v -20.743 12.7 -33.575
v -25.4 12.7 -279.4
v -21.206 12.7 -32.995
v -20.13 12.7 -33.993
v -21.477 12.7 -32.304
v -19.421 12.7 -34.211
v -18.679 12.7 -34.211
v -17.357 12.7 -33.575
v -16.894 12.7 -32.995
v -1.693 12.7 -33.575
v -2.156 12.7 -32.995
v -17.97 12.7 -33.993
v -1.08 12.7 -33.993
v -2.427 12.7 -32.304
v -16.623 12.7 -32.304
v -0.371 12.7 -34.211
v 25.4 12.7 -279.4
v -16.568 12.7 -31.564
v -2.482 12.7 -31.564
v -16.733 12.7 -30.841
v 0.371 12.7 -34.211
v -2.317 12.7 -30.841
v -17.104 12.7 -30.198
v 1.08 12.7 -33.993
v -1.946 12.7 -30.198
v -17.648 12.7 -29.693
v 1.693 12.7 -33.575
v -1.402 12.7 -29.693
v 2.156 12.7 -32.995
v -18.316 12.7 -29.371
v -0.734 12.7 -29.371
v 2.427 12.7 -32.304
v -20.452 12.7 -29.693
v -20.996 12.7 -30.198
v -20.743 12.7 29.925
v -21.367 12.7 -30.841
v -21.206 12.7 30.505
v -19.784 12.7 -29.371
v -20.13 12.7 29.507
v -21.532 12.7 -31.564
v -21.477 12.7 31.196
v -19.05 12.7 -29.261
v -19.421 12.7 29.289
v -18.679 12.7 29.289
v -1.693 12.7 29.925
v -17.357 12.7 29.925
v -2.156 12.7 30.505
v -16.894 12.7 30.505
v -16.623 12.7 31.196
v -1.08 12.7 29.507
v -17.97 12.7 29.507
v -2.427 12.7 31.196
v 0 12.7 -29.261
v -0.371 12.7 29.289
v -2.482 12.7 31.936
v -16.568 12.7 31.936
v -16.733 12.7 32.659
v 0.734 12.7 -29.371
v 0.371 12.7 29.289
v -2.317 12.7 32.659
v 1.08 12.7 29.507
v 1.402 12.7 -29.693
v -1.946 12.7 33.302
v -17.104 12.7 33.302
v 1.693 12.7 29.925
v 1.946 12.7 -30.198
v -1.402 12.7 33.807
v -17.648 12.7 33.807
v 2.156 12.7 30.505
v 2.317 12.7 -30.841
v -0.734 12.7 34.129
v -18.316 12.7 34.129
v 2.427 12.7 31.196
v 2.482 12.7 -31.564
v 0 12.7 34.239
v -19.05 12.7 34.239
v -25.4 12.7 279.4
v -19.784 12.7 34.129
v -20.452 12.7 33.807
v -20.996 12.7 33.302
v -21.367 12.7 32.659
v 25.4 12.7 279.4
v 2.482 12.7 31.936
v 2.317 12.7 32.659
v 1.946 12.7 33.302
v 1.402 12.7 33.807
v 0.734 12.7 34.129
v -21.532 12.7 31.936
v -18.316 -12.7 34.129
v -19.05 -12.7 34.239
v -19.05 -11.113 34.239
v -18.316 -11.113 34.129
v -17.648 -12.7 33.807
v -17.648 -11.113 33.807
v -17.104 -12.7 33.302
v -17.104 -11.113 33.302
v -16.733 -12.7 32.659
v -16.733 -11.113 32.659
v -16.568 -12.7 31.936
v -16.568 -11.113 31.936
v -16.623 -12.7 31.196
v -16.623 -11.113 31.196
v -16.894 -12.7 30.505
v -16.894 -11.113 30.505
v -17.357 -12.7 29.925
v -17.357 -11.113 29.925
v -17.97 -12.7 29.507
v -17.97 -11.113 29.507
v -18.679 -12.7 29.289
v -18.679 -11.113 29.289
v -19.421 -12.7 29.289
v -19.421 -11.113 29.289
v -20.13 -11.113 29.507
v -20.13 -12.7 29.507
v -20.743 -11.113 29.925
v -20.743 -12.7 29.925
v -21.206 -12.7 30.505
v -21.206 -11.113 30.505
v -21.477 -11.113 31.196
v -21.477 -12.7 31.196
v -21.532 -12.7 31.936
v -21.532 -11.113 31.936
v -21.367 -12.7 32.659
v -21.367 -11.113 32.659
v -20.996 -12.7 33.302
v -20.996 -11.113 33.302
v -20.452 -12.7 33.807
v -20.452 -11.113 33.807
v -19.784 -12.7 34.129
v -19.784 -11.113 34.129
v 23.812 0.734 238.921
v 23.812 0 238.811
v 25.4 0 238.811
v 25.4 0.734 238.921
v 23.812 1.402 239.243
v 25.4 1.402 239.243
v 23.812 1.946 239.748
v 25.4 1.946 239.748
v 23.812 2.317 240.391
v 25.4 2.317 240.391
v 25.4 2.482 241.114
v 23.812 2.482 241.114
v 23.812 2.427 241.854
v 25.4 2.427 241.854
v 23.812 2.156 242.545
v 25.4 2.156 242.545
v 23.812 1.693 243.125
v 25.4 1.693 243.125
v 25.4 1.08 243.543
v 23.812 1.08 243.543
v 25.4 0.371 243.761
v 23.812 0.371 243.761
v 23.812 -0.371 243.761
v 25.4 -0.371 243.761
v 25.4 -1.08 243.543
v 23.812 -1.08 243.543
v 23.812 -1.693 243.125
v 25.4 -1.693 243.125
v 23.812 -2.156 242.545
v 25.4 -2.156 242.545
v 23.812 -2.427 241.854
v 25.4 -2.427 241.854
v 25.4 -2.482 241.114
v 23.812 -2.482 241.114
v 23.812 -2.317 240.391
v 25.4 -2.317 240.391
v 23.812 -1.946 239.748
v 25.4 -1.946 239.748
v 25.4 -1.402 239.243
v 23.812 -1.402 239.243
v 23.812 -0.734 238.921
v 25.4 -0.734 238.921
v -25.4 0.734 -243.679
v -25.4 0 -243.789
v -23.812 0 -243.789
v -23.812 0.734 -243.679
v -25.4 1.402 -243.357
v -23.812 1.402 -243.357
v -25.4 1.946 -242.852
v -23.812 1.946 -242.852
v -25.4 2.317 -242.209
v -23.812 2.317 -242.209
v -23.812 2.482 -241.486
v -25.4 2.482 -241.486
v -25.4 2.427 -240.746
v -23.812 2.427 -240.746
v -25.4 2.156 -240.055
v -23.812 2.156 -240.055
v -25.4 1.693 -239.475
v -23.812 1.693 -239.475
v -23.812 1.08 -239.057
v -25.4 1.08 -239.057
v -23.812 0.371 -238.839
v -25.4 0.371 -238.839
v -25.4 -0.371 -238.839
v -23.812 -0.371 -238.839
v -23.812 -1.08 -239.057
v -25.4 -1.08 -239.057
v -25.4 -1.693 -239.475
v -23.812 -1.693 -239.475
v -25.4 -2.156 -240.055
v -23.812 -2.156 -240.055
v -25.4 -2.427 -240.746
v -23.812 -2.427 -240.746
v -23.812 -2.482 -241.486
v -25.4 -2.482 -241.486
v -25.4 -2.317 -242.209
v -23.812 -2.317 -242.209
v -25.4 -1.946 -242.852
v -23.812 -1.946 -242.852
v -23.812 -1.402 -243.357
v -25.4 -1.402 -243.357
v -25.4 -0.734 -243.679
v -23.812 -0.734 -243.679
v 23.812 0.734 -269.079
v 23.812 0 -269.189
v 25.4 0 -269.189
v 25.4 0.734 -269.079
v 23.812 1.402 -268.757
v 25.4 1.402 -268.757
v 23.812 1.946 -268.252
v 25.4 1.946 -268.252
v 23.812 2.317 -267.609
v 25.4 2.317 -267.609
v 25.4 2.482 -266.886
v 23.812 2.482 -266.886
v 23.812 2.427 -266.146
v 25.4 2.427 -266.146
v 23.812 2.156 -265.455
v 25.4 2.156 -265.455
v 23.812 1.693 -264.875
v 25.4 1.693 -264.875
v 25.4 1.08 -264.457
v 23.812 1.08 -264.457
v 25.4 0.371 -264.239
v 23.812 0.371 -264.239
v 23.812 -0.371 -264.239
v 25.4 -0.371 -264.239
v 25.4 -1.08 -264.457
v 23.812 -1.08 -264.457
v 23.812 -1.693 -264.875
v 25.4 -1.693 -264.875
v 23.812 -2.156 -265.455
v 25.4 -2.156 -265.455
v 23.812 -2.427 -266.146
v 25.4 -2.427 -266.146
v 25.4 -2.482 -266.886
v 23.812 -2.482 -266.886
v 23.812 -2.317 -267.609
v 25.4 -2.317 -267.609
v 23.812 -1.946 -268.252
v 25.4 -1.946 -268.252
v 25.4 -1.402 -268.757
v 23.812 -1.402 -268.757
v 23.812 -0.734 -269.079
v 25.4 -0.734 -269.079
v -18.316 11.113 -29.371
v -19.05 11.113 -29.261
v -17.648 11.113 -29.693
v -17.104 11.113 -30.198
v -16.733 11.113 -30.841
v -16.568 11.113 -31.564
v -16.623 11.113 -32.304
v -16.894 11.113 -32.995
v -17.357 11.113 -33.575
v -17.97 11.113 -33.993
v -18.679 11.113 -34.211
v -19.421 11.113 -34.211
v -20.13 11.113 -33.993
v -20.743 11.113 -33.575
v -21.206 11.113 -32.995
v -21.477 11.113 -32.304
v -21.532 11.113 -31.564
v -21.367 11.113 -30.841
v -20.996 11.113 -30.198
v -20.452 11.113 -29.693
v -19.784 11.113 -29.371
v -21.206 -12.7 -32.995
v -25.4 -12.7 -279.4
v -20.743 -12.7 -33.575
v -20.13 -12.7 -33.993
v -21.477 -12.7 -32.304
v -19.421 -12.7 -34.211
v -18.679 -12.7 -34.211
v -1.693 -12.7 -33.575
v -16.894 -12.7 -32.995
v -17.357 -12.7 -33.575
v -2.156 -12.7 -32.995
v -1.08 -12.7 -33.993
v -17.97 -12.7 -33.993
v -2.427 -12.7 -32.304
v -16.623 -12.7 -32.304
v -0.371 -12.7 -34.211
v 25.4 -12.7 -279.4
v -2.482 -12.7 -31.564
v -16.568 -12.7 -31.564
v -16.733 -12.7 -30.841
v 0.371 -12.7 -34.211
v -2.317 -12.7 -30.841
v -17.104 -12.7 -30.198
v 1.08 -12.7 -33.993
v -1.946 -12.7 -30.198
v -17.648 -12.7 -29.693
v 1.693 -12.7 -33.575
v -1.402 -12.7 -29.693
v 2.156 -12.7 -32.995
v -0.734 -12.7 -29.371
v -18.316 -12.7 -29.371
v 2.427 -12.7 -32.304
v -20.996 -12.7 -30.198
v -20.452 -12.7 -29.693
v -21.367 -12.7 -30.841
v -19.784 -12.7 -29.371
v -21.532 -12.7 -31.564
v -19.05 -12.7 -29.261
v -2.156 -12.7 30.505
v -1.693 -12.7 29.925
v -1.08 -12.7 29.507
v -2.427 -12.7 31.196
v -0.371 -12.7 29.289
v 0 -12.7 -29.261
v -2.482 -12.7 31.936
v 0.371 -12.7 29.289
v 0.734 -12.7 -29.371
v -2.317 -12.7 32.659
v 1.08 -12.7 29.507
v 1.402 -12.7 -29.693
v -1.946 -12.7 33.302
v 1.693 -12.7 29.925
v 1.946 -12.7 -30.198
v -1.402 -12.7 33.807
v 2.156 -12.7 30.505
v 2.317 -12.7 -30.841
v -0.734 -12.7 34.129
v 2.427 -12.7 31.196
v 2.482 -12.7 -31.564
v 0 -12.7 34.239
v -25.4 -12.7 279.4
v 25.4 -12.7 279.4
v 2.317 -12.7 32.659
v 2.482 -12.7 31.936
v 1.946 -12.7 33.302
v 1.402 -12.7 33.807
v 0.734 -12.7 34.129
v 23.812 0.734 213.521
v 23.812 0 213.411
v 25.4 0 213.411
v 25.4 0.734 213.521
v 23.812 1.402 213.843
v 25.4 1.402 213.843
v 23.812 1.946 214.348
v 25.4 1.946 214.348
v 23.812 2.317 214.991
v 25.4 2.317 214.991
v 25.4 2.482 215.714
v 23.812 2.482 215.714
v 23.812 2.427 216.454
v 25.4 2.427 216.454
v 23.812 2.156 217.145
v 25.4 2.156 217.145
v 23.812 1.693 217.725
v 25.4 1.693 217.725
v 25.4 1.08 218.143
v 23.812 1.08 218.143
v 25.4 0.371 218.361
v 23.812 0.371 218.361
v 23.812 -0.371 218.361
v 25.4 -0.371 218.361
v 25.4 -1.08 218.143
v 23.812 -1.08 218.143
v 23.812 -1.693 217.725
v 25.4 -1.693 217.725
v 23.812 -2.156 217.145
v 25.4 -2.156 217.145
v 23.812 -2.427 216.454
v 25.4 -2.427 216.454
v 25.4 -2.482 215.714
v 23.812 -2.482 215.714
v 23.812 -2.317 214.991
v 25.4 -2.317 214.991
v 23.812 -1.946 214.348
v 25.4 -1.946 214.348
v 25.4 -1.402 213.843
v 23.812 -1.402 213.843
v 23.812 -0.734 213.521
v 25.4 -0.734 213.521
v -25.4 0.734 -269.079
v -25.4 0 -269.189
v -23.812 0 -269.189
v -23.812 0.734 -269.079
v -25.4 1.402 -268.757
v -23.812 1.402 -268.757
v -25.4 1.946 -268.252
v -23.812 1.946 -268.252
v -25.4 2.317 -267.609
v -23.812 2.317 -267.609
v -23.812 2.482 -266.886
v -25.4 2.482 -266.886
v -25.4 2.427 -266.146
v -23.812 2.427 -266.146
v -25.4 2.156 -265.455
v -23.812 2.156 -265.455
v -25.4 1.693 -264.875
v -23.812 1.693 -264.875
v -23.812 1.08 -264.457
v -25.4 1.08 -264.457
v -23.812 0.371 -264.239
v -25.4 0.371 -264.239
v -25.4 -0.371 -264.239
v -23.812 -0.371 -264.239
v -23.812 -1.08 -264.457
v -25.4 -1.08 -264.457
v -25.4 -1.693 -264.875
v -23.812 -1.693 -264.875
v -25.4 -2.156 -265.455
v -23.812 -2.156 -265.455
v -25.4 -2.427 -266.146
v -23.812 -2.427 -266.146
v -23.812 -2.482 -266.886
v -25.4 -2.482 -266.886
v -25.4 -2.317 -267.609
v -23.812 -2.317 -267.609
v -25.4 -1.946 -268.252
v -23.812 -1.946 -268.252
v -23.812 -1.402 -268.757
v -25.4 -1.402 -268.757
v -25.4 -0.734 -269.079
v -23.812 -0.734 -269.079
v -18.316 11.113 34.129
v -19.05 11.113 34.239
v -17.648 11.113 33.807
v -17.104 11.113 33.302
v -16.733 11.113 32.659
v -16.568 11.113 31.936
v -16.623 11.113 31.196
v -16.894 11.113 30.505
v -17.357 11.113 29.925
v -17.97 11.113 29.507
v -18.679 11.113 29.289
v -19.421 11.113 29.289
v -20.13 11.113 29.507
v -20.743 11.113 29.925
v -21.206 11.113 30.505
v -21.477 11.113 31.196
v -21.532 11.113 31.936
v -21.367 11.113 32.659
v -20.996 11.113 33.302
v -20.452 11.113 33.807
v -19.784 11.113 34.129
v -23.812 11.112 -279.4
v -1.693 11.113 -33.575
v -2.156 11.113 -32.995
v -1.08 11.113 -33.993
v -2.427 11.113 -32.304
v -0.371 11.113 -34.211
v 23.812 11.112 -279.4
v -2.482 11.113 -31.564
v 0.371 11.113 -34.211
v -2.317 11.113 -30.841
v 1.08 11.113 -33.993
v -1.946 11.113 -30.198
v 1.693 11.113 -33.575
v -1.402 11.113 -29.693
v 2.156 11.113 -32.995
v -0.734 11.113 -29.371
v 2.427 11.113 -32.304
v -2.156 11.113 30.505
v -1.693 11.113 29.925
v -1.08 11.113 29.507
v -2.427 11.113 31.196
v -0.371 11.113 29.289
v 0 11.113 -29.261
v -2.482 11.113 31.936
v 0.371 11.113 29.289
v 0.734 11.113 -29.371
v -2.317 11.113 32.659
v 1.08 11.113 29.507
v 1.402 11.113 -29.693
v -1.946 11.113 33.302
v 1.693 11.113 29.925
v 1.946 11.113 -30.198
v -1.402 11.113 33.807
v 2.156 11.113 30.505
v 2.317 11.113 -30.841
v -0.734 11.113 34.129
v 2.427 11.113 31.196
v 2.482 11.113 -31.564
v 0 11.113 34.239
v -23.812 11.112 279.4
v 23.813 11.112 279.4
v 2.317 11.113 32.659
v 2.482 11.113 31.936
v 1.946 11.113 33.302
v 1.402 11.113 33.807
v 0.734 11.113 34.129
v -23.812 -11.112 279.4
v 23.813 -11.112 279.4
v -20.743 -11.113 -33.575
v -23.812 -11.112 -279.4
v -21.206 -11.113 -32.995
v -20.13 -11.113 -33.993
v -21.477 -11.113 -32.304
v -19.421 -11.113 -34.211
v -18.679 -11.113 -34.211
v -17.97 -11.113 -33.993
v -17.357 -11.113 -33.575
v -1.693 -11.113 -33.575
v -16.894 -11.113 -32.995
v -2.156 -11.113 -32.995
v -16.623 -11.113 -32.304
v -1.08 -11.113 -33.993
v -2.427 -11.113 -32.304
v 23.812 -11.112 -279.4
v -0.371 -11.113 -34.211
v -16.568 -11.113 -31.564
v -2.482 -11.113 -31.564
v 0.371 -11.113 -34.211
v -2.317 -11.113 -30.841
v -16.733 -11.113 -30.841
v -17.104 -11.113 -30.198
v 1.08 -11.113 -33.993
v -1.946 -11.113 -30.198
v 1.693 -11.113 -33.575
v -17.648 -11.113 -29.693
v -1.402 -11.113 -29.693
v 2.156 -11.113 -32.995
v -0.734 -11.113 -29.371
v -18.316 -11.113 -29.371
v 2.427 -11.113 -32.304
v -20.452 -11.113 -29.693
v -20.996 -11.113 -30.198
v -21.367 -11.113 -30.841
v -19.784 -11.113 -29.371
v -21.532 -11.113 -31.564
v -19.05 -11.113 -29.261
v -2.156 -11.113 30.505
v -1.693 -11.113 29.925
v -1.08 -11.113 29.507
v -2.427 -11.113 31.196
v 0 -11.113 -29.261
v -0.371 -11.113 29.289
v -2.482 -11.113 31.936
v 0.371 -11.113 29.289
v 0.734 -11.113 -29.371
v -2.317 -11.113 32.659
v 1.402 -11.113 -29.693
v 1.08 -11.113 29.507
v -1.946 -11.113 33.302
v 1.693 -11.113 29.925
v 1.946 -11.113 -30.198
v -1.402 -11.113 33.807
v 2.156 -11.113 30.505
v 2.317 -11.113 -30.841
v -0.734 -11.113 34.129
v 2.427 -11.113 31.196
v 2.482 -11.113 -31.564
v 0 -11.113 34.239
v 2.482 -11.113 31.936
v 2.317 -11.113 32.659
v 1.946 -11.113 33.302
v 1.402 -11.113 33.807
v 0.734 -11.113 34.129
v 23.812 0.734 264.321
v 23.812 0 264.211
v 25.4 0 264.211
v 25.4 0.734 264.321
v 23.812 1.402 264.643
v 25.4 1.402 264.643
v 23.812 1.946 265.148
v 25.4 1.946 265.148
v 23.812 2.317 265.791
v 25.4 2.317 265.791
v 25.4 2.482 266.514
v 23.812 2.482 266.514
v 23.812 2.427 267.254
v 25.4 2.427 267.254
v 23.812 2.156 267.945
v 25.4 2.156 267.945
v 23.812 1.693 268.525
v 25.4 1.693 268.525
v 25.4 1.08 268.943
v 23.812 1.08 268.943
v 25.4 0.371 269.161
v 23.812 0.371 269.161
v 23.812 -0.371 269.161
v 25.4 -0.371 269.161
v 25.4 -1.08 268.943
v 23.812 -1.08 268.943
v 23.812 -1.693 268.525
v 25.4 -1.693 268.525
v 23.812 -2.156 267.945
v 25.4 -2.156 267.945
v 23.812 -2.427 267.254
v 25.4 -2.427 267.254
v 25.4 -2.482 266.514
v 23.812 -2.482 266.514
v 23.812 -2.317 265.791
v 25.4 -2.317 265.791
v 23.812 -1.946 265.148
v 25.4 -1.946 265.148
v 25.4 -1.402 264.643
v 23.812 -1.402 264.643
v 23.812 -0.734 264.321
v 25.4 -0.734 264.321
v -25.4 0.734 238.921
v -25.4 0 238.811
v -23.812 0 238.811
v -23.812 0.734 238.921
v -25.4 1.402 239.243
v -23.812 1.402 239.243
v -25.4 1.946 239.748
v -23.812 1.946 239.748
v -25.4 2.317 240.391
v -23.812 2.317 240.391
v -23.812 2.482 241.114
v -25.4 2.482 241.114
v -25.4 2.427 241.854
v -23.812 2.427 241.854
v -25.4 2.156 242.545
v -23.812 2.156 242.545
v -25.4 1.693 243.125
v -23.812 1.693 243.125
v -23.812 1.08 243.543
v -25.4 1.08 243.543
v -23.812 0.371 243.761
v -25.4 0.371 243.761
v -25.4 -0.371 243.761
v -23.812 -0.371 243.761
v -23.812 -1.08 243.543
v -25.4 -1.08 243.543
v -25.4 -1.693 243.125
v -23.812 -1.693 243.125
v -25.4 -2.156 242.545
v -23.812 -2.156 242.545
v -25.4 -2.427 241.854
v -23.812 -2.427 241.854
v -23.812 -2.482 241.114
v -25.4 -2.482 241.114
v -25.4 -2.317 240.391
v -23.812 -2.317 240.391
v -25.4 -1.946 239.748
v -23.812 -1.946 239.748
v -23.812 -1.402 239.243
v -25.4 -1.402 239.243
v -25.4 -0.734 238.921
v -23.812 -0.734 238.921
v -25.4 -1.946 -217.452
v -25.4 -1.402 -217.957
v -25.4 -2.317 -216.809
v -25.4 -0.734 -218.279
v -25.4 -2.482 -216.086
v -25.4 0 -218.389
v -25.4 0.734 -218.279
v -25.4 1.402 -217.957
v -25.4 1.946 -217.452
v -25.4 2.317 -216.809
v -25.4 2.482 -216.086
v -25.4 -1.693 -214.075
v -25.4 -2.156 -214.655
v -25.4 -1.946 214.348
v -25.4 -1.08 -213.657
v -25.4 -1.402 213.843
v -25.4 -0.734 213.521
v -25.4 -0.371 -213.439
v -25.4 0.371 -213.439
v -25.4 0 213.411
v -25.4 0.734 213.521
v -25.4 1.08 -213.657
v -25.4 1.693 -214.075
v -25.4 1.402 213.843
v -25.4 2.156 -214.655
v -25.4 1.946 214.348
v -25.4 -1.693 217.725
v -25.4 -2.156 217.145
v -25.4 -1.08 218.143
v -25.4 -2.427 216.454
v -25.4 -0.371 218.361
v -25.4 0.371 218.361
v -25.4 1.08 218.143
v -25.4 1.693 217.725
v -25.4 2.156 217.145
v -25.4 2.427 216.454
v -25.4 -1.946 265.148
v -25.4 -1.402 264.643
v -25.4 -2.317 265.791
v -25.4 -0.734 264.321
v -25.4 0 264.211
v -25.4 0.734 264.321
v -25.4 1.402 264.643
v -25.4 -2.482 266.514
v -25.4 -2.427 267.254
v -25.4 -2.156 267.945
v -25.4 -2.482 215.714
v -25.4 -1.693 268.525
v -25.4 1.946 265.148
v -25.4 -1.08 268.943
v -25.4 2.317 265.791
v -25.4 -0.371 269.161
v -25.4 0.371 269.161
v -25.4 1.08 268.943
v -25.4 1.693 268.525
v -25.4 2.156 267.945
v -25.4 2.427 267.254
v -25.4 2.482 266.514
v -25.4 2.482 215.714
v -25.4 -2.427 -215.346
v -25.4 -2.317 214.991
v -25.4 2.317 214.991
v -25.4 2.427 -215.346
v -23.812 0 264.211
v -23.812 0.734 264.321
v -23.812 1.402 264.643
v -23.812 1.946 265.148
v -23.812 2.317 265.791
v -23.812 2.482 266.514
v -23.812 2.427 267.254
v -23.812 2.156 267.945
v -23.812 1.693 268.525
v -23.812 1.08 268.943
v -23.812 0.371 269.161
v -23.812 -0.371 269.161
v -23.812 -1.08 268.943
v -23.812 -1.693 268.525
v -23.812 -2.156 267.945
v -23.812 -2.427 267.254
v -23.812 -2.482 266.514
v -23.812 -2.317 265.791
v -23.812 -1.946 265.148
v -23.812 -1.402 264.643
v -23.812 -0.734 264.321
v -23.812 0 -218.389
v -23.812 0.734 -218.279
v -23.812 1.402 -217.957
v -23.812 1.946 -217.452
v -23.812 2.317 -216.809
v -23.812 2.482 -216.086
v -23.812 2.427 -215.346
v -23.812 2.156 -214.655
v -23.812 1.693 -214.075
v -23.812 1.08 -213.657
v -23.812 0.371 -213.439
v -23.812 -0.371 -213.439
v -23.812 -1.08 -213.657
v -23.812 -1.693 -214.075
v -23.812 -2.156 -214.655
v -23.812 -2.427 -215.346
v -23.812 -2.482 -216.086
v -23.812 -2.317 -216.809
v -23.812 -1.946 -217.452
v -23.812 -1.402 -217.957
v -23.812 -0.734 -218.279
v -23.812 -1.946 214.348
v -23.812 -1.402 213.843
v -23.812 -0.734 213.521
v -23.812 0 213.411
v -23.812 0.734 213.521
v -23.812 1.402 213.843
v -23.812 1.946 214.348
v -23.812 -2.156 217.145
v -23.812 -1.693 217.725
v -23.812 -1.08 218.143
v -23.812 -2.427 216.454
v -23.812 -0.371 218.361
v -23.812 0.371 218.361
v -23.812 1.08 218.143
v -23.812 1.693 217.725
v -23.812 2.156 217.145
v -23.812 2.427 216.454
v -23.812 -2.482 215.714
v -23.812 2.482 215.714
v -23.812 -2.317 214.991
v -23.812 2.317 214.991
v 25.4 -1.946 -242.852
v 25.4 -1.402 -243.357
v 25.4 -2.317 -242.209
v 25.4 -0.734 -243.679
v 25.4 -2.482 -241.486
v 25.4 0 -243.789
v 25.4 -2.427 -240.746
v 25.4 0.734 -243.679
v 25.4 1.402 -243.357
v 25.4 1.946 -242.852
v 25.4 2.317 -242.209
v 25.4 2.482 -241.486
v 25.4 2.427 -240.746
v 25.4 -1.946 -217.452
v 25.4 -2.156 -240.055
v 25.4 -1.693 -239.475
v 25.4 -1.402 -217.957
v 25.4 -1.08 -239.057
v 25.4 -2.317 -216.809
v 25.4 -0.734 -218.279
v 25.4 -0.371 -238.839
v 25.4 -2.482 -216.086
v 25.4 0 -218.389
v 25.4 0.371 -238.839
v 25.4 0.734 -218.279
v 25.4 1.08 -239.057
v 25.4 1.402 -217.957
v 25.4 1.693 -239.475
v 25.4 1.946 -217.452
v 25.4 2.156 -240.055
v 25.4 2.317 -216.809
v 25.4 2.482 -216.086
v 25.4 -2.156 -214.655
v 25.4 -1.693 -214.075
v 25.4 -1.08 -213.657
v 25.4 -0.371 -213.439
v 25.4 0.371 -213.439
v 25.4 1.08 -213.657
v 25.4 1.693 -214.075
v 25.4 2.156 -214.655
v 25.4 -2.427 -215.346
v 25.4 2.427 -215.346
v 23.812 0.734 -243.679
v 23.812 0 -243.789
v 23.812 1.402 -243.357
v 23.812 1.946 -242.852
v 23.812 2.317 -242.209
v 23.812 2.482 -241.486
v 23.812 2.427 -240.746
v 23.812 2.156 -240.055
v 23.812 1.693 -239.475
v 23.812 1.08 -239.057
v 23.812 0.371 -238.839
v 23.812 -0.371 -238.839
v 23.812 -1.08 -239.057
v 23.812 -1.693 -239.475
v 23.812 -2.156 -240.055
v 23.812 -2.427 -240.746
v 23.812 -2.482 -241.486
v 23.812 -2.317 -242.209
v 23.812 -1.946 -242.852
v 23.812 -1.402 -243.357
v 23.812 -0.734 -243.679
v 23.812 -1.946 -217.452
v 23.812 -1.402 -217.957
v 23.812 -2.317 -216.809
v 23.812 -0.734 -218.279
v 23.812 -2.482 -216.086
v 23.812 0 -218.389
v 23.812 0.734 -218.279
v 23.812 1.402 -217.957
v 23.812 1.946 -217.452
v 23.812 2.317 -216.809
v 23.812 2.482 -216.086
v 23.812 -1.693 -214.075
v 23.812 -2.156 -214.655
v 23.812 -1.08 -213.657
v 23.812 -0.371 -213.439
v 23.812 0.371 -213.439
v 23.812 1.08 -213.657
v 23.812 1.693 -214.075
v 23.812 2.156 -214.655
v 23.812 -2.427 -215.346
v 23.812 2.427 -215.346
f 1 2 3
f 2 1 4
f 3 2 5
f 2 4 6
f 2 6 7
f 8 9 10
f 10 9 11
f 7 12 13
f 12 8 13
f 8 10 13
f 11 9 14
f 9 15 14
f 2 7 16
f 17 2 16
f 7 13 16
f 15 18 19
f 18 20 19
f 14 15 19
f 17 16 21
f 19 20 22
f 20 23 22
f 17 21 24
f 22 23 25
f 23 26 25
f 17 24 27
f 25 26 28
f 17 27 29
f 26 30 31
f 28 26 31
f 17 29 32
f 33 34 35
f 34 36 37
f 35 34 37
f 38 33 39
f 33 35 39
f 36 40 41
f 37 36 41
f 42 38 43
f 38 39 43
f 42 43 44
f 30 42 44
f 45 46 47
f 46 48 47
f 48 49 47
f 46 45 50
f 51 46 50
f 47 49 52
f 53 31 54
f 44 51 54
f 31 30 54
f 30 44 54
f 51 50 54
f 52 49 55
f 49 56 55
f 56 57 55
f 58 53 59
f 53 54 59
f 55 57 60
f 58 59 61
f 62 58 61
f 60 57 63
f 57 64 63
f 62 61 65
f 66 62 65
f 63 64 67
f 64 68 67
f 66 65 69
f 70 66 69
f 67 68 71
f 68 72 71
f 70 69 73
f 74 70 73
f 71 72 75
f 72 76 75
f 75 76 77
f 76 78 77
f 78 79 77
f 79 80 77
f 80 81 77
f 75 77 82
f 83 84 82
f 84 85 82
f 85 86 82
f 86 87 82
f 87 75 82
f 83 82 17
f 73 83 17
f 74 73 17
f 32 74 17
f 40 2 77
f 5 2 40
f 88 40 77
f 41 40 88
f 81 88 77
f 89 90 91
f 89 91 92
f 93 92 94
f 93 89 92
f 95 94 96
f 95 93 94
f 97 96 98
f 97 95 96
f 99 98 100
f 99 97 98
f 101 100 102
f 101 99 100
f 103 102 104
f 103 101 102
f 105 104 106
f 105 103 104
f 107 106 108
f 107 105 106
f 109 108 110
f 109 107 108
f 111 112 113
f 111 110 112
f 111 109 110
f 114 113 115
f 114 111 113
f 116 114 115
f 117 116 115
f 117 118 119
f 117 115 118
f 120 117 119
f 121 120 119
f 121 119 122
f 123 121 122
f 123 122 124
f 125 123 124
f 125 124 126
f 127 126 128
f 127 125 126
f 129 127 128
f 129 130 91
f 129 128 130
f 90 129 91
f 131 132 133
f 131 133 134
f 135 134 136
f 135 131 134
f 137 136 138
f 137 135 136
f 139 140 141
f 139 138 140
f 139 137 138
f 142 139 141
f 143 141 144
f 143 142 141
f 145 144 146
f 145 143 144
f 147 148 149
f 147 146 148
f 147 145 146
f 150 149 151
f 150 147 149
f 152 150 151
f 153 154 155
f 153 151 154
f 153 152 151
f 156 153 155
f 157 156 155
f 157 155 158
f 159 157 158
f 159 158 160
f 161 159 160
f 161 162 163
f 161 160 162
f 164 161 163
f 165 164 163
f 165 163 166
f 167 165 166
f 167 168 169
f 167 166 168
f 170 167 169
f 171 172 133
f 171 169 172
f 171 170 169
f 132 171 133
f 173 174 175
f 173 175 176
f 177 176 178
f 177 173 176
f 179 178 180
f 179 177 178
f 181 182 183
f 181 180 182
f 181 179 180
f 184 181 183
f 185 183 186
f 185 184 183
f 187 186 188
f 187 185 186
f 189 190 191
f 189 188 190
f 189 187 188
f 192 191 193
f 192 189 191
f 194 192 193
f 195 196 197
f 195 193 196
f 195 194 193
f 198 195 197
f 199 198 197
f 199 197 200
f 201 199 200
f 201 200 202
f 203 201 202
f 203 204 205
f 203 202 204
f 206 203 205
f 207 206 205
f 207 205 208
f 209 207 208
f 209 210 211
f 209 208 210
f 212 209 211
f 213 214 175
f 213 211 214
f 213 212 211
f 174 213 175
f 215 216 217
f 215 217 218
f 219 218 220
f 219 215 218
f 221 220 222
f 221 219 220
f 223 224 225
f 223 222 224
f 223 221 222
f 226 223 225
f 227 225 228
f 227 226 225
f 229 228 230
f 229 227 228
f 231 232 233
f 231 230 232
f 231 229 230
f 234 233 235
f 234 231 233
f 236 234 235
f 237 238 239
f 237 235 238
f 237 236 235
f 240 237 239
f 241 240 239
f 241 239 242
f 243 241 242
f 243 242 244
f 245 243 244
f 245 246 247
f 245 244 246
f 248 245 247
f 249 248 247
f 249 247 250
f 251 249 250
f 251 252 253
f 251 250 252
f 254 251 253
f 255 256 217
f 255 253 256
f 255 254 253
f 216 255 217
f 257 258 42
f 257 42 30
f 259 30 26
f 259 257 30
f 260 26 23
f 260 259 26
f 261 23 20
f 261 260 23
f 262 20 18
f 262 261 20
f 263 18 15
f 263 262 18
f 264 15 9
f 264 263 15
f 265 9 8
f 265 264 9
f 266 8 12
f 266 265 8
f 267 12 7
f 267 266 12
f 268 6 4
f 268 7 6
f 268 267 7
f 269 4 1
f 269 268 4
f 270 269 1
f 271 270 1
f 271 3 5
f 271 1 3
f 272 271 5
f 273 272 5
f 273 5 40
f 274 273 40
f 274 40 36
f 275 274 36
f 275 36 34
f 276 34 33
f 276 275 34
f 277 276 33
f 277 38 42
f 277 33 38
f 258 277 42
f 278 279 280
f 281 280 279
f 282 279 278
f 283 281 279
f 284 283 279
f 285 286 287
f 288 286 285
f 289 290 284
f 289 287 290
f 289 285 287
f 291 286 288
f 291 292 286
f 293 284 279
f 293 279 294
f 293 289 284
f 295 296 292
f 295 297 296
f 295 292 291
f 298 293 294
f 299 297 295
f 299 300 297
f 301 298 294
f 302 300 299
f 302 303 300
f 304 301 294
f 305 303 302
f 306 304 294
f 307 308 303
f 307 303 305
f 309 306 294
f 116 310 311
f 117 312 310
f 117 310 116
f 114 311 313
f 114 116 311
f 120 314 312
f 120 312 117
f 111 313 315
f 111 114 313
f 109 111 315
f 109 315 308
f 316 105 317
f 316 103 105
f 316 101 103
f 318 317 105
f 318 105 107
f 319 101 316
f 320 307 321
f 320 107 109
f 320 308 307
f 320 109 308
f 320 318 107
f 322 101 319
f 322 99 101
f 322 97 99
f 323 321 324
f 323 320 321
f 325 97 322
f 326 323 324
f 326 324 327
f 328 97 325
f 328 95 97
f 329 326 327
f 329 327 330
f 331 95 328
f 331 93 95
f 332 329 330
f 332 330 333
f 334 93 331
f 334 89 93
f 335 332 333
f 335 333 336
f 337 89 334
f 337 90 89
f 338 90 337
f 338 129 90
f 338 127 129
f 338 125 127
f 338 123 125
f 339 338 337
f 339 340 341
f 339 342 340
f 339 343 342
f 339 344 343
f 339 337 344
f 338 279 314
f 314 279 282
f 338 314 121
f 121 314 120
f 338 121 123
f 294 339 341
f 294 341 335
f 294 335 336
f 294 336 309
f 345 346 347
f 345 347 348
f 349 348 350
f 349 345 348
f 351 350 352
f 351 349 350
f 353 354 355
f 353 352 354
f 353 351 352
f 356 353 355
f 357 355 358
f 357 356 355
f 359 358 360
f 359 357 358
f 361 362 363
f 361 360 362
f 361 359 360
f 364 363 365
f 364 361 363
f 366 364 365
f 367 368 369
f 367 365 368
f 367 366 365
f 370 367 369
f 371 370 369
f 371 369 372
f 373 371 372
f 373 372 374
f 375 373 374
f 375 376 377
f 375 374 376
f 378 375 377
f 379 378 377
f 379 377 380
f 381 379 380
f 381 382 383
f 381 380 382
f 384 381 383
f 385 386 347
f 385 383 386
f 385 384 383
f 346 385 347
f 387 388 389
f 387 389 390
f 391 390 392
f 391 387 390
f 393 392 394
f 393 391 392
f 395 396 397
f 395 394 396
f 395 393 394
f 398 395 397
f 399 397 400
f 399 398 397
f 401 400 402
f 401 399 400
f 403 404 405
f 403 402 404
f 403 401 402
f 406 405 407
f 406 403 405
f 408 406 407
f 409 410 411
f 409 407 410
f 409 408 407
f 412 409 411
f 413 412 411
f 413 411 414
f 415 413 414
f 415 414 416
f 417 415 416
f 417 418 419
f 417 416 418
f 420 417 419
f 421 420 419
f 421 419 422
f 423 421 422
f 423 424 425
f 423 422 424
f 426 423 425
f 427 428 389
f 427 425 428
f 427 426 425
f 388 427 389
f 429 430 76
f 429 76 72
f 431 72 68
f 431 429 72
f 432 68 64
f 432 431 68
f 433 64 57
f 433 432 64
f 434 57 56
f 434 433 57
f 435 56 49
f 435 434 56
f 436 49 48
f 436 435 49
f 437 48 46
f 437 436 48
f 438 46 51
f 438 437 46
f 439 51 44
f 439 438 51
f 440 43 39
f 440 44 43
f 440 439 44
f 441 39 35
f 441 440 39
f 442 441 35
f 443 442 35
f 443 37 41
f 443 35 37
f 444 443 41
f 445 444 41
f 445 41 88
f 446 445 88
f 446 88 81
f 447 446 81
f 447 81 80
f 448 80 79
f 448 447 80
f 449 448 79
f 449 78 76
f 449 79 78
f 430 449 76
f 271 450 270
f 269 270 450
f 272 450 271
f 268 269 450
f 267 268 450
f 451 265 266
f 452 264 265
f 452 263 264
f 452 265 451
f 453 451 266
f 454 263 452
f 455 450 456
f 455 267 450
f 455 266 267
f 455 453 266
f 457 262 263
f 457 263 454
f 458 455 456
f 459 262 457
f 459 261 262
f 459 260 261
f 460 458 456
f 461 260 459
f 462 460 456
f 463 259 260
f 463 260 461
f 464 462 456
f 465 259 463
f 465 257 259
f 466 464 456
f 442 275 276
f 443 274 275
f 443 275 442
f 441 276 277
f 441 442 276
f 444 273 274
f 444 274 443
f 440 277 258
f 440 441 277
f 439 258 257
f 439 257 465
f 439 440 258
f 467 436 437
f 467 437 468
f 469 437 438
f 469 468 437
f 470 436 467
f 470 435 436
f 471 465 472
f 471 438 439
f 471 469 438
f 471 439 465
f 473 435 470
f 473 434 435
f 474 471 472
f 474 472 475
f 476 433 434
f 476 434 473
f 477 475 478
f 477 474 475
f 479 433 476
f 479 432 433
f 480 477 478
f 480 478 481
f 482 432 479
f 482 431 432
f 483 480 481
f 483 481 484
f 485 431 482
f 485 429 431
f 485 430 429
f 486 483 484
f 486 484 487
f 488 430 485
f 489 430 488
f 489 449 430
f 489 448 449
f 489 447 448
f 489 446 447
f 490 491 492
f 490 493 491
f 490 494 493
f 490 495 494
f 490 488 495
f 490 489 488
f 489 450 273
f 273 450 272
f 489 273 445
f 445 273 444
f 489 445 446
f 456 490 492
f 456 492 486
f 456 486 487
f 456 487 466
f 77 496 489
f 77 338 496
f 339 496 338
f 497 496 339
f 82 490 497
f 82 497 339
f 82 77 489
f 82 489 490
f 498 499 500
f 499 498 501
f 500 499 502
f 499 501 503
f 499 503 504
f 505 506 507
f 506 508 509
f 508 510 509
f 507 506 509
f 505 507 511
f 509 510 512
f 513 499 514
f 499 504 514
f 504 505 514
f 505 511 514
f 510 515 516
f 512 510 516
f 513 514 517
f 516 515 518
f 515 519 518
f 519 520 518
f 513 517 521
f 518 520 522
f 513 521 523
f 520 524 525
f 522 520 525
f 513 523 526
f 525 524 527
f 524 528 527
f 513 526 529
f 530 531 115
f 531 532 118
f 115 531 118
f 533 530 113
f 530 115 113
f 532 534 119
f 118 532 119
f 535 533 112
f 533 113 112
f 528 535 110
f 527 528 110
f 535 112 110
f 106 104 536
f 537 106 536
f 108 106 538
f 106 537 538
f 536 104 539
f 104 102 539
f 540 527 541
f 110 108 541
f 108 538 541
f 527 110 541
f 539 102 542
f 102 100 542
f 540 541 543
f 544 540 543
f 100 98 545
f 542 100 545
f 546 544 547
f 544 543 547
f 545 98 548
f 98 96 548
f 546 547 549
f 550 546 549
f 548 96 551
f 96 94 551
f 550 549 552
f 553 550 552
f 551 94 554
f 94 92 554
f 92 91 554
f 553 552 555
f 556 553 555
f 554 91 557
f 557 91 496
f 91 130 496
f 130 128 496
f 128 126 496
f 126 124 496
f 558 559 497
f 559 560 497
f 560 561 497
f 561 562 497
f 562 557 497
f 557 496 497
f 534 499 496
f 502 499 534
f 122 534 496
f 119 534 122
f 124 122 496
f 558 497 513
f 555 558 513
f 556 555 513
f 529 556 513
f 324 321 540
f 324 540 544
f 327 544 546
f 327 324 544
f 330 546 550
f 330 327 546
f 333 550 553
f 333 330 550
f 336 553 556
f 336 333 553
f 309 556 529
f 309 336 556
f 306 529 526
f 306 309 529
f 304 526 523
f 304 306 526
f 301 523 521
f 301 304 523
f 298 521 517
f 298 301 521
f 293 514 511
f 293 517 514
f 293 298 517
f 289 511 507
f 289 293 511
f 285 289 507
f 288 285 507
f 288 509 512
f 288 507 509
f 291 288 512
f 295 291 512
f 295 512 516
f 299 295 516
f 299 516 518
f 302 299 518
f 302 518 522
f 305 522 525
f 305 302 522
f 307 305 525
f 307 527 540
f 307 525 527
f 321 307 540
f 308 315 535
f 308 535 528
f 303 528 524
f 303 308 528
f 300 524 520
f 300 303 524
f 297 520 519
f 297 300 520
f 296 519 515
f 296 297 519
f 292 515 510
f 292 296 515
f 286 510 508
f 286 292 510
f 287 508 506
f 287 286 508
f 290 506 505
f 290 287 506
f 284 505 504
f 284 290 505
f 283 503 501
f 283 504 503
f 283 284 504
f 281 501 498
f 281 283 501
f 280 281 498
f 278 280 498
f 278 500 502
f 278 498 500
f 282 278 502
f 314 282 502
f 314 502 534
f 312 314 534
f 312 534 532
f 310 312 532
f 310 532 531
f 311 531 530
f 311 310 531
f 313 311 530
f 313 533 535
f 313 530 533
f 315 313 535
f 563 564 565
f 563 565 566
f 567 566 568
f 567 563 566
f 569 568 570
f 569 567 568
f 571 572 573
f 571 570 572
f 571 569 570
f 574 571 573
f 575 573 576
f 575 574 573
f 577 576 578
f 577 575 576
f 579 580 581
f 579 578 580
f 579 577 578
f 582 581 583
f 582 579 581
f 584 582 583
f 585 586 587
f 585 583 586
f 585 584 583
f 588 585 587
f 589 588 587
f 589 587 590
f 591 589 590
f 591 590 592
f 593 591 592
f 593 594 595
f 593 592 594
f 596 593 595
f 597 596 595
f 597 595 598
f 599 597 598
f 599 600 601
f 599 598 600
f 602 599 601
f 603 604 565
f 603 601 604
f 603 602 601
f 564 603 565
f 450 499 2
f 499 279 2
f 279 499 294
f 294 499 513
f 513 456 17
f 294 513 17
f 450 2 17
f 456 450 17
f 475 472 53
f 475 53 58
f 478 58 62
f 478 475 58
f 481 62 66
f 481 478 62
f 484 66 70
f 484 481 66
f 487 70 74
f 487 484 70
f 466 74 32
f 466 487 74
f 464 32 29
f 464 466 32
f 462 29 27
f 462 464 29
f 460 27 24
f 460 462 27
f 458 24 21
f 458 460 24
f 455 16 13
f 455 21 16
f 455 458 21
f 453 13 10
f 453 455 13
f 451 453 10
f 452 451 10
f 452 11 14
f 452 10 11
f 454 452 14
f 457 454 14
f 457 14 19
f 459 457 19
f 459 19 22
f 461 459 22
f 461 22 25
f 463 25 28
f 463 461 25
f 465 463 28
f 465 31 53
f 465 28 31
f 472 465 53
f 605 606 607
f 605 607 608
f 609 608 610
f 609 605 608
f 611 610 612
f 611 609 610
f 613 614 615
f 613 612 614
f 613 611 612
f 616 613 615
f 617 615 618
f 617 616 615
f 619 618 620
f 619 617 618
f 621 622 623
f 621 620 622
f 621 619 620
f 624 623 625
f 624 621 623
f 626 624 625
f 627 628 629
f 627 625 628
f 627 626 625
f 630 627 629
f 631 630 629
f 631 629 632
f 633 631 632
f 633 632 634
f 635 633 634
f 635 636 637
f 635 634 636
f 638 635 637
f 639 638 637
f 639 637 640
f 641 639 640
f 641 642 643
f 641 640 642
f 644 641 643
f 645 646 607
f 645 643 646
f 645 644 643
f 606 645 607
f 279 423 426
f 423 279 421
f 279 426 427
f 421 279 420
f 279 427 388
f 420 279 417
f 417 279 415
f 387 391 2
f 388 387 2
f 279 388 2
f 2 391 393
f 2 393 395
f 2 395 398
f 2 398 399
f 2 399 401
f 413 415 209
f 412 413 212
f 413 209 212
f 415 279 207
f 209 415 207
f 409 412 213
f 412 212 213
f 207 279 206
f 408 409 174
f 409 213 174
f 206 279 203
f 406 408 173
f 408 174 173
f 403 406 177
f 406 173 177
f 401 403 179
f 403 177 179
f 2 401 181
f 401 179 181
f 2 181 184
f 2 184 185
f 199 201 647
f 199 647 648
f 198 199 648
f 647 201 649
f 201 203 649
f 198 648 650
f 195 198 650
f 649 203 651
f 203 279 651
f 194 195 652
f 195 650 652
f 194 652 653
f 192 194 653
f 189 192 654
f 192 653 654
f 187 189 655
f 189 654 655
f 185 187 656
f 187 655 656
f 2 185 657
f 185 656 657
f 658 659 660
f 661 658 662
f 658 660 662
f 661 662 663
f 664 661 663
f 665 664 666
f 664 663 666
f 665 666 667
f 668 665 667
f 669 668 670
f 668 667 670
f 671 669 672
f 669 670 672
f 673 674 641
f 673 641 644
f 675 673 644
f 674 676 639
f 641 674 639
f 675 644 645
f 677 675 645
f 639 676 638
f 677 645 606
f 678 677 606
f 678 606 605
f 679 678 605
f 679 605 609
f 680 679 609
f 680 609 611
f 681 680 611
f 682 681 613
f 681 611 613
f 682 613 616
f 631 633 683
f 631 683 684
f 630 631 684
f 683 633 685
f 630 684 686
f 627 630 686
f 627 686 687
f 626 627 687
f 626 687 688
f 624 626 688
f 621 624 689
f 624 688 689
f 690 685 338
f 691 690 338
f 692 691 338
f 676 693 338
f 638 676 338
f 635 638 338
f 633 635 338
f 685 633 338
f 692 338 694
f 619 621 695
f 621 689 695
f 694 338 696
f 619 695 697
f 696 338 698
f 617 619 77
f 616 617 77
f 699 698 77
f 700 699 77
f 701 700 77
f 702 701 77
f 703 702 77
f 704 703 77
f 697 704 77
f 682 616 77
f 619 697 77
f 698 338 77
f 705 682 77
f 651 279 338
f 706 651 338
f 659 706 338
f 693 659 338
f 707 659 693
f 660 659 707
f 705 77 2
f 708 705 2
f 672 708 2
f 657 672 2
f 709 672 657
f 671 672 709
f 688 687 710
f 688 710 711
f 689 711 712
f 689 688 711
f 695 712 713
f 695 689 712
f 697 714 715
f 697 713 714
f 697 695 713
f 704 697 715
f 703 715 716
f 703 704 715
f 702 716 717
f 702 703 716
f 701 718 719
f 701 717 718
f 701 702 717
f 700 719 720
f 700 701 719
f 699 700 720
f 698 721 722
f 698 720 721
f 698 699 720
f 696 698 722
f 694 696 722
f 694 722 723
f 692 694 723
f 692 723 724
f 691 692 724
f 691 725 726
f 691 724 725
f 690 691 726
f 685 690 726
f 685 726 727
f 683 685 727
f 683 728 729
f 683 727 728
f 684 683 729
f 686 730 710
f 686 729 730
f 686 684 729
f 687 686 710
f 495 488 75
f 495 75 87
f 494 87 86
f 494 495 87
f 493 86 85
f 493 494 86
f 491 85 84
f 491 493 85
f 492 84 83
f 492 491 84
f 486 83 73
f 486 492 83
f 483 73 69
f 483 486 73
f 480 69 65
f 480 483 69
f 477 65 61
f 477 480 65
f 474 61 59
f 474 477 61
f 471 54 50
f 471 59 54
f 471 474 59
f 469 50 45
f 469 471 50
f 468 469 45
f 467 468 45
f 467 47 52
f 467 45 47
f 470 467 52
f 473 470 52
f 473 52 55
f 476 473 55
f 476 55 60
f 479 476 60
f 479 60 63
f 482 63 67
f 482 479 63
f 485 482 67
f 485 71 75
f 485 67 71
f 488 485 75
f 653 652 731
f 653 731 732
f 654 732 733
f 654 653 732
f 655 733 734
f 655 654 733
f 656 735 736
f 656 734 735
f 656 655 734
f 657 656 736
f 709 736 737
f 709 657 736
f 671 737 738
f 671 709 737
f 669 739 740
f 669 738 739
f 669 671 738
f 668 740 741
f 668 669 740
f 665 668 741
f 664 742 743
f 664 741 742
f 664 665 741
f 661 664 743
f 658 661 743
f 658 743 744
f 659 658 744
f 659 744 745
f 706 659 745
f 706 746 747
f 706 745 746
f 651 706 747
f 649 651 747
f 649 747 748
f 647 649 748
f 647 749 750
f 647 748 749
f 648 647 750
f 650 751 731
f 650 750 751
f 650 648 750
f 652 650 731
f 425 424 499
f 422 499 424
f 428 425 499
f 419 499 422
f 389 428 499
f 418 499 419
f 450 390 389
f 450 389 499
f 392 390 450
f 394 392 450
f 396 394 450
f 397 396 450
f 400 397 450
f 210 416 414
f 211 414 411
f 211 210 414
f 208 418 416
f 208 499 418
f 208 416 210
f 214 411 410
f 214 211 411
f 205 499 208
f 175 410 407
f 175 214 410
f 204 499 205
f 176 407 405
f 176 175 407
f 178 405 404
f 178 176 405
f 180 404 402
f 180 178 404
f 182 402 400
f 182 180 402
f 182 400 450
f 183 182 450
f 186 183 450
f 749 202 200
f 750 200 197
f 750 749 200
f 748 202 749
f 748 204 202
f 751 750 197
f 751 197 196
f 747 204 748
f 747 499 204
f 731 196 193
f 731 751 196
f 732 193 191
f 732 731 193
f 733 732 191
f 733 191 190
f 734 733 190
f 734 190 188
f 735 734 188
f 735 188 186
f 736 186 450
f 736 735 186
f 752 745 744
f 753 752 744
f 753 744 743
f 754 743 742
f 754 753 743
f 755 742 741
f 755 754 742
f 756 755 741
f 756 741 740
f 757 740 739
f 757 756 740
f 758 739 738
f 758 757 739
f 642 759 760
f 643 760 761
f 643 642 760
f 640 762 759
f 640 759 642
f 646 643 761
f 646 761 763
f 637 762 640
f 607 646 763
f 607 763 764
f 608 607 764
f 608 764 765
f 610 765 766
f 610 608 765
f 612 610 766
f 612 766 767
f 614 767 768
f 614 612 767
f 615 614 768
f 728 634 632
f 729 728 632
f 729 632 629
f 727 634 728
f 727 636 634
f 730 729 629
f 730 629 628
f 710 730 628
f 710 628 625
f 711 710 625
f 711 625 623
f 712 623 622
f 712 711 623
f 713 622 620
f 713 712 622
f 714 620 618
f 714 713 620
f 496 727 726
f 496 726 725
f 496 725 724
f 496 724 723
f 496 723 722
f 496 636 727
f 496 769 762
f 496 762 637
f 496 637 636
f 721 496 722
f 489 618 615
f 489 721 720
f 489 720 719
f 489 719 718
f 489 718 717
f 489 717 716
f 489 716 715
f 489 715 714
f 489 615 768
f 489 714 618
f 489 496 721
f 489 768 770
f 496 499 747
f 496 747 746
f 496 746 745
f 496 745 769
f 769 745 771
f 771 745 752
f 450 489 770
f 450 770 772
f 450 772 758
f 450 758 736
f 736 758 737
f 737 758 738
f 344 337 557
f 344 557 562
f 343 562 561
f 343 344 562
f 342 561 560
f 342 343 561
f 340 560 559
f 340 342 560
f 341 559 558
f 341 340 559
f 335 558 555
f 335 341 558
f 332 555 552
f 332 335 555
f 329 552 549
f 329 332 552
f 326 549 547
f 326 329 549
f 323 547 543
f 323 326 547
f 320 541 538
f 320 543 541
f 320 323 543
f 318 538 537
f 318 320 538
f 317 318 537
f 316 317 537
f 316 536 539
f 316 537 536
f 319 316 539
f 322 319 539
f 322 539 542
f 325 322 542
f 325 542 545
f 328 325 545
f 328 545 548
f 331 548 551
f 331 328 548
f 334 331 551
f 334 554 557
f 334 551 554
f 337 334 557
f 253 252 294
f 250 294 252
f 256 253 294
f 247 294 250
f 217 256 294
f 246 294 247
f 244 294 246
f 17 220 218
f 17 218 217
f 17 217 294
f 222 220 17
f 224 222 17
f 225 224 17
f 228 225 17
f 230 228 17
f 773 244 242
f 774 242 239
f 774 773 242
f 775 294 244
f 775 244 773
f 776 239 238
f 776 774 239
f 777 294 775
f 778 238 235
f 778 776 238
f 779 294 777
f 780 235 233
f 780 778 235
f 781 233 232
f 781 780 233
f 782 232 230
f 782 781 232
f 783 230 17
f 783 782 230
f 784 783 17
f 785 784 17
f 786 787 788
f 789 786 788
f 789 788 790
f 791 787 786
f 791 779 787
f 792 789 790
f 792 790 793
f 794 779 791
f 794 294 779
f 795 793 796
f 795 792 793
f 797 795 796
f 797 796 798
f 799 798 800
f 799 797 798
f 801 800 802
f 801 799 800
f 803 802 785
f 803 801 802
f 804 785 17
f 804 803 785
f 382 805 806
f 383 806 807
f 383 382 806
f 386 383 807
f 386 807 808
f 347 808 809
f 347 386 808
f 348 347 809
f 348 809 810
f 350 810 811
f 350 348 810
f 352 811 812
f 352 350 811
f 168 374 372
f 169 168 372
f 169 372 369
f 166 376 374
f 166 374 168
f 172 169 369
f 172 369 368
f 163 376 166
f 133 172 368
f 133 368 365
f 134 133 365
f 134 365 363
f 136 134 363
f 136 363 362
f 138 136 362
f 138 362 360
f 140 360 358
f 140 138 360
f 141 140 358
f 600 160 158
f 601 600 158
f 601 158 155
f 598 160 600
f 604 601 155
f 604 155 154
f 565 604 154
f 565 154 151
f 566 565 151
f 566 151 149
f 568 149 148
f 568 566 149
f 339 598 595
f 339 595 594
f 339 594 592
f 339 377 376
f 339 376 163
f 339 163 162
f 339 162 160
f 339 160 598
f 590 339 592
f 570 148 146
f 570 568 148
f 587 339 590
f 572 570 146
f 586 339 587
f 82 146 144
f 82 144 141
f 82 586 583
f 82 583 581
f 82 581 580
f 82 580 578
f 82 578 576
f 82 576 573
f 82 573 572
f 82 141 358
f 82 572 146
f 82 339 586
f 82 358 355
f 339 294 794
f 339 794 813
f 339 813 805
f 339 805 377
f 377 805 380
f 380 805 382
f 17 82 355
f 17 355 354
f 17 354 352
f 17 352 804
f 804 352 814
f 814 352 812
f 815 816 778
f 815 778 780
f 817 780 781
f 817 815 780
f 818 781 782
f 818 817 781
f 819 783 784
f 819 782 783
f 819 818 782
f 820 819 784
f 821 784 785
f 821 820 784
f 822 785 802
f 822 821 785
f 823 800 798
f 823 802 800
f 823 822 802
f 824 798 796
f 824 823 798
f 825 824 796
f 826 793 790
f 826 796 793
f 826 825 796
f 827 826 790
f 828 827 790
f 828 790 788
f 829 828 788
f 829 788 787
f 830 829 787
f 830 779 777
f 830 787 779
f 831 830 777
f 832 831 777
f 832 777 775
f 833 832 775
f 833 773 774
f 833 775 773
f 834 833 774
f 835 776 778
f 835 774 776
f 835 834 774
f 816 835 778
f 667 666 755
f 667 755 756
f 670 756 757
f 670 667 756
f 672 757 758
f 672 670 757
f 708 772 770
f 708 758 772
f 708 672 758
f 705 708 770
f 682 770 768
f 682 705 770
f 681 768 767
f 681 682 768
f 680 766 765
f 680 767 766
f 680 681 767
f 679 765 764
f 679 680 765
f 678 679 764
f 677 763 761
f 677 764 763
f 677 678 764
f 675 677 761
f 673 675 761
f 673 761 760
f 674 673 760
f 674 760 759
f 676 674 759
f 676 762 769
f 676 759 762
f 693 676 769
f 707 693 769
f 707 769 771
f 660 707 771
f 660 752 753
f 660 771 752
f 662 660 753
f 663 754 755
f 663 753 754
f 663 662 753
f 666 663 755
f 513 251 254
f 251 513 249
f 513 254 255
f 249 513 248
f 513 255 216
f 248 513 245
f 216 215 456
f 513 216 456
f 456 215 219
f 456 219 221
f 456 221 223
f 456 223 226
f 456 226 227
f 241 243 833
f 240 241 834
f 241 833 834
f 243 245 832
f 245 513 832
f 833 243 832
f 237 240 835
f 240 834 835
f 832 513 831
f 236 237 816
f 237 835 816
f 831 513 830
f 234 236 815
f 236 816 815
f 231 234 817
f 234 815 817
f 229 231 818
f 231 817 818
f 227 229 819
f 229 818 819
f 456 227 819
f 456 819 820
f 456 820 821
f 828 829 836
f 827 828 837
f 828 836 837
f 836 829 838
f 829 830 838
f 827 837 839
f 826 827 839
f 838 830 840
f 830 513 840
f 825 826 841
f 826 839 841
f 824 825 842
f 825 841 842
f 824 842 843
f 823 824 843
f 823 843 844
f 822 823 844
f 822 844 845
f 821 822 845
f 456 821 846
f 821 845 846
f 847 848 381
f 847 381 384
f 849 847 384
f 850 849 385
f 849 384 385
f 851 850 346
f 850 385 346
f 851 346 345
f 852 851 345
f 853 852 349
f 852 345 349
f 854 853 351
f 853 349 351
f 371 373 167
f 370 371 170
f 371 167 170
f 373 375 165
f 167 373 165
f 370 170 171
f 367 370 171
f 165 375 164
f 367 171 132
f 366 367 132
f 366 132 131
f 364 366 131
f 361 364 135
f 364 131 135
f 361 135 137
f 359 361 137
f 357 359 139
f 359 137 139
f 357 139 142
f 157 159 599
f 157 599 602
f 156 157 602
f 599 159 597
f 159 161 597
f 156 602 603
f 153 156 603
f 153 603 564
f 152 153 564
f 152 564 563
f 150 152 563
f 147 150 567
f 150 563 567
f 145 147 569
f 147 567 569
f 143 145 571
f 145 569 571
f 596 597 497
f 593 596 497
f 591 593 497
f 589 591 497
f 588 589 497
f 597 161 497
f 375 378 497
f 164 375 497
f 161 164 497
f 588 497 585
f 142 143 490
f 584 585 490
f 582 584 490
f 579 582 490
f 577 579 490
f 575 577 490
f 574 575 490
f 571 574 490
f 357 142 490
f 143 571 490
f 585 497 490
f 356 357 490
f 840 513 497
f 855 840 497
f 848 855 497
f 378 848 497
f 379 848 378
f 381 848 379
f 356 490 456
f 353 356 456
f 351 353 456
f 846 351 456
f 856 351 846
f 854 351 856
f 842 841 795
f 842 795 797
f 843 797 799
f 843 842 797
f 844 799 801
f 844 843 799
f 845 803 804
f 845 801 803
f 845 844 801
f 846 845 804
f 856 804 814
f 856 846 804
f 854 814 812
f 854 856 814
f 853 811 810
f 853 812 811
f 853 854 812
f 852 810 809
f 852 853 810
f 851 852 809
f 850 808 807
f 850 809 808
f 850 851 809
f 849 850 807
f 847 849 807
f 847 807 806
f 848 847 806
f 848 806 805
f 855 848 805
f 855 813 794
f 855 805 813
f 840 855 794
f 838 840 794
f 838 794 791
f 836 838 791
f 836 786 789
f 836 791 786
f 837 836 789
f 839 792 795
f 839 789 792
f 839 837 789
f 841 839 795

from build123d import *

# Parameters (mm, degrees)
SKETCH1_W               = 50.8
SKETCH1_H               = 25.4
BOSS_EXTRUDE1_DEPTH     = 279.4
SHELL1_T                = -1.5875
CUT_EXTRUDE1_DEPTH      = 281.839473721
CUT_EXTRUDE1_DEPTH_BACK = 281.839473721
SKETCH3_R               = 2.4892
CUT_EXTRUDE2_DEPTH      = 281.839473721
CUT_EXTRUDE2_DEPTH_BACK = 281.839473721
SKETCH4_R               = 2.4892


with BuildPart() as part:
    # Sketch1 → Boss-Extrude1 (new, symmetric)
    with BuildSketch(Plane.XY):
        Rectangle(SKETCH1_W, SKETCH1_H)
    extrude(amount=BOSS_EXTRUDE1_DEPTH, both=True)

    # Shell1
    shell1_openings = [part.faces().sort_by_distance(p)[0] for p in [
        (0, 0, 279.4),
        (0, 0, -279.4),
    ]]
    offset(amount=SHELL1_T, openings=shell1_openings, kind=Kind.INTERSECTION)

    # Sketch3 → Cut-Extrude1 (cut, two sides: drawn at the far end of the back side and taken through both)
    with BuildSketch(Plane(origin=(0, 0, 0), x_dir=(0, 0, -1), z_dir=(1, 0, 0)).offset(-CUT_EXTRUDE1_DEPTH_BACK)):
        with Locations((-266.7, 0)):
            Circle(SKETCH3_R)
        with Locations((-241.3, 0)):
            Circle(SKETCH3_R)
        with Locations((-215.9, 0)):
            Circle(SKETCH3_R)
        with Locations((215.9, 0)):
            Circle(SKETCH3_R)
        with Locations((241.3, 0)):
            Circle(SKETCH3_R)
        with Locations((266.7, 0)):
            Circle(SKETCH3_R)
    extrude(amount=CUT_EXTRUDE1_DEPTH + CUT_EXTRUDE1_DEPTH_BACK, mode=Mode.SUBTRACT)

    # Sketch4 → Cut-Extrude2 (cut, two sides: drawn at the far end of the back side and taken through both)
    with BuildSketch(Plane(origin=(0, 0, 0), x_dir=(1, 0, 0), z_dir=(0, 1, 0)).offset(-CUT_EXTRUDE2_DEPTH_BACK)):
        with Locations(Location((0, -31.75, 0), (0, 0, 270))):
            Circle(SKETCH4_R)
        with Locations(Location((-19.05, -31.75, 0), (0, 0, 270))):
            Circle(SKETCH4_R)
        with Locations(Location((0, 31.75, 0), (0, 0, 270))):
            Circle(SKETCH4_R)
        with Locations(Location((-19.05, 31.75, 0), (0, 0, 270))):
            Circle(SKETCH4_R)
    extrude(amount=CUT_EXTRUDE2_DEPTH + CUT_EXTRUDE2_DEPTH_BACK, mode=Mode.SUBTRACT)


solid = part.part
